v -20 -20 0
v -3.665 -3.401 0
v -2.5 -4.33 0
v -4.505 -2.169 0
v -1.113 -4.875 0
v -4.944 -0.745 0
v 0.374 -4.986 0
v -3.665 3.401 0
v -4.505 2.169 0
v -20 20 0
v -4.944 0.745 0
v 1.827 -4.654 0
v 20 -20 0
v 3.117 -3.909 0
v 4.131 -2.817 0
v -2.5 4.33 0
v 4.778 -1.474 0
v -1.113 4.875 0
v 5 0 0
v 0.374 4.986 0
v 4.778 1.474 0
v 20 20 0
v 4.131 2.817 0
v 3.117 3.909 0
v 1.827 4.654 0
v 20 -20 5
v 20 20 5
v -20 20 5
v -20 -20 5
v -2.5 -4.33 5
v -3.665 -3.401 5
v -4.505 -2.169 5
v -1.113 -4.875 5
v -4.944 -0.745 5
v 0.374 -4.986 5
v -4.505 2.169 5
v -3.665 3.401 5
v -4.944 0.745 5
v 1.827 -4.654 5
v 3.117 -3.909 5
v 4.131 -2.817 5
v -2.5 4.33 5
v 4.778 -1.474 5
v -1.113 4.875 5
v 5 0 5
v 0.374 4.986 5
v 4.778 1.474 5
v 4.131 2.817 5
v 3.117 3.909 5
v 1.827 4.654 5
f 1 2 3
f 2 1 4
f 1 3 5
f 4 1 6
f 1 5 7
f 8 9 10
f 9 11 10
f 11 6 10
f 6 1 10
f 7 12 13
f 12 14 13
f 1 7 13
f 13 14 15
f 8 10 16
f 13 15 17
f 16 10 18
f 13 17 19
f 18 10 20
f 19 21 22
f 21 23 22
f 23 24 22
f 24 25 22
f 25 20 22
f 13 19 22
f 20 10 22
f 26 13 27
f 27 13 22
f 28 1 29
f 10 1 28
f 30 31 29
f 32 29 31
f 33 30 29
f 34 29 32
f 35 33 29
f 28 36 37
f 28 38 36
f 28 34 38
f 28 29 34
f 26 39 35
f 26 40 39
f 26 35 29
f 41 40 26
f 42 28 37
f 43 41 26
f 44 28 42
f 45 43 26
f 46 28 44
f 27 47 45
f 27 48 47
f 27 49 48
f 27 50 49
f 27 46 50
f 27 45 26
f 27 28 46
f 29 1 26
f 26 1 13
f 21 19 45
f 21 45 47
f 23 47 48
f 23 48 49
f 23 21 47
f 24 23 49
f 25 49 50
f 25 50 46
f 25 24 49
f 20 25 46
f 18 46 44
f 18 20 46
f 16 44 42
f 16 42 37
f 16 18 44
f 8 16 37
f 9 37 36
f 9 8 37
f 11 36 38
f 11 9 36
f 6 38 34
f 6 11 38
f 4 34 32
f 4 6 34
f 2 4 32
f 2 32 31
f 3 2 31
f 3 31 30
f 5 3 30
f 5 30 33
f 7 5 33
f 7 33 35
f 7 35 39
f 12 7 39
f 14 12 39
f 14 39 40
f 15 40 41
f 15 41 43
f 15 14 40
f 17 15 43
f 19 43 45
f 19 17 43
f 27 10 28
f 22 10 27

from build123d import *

# Parameters (mm, degrees)
SKETCH_W      = 40
SKETCH_H      = 40
SKETCH_R      = 5
EXTRUDE_DEPTH = 5


with BuildPart() as part:
    # Sketch → Extrude (new body)
    with BuildSketch(Plane.XY):
        Rectangle(SKETCH_W, SKETCH_H)
        Circle(SKETCH_R, mode=Mode.SUBTRACT)
    extrude(amount=EXTRUDE_DEPTH)


solid = part.part
